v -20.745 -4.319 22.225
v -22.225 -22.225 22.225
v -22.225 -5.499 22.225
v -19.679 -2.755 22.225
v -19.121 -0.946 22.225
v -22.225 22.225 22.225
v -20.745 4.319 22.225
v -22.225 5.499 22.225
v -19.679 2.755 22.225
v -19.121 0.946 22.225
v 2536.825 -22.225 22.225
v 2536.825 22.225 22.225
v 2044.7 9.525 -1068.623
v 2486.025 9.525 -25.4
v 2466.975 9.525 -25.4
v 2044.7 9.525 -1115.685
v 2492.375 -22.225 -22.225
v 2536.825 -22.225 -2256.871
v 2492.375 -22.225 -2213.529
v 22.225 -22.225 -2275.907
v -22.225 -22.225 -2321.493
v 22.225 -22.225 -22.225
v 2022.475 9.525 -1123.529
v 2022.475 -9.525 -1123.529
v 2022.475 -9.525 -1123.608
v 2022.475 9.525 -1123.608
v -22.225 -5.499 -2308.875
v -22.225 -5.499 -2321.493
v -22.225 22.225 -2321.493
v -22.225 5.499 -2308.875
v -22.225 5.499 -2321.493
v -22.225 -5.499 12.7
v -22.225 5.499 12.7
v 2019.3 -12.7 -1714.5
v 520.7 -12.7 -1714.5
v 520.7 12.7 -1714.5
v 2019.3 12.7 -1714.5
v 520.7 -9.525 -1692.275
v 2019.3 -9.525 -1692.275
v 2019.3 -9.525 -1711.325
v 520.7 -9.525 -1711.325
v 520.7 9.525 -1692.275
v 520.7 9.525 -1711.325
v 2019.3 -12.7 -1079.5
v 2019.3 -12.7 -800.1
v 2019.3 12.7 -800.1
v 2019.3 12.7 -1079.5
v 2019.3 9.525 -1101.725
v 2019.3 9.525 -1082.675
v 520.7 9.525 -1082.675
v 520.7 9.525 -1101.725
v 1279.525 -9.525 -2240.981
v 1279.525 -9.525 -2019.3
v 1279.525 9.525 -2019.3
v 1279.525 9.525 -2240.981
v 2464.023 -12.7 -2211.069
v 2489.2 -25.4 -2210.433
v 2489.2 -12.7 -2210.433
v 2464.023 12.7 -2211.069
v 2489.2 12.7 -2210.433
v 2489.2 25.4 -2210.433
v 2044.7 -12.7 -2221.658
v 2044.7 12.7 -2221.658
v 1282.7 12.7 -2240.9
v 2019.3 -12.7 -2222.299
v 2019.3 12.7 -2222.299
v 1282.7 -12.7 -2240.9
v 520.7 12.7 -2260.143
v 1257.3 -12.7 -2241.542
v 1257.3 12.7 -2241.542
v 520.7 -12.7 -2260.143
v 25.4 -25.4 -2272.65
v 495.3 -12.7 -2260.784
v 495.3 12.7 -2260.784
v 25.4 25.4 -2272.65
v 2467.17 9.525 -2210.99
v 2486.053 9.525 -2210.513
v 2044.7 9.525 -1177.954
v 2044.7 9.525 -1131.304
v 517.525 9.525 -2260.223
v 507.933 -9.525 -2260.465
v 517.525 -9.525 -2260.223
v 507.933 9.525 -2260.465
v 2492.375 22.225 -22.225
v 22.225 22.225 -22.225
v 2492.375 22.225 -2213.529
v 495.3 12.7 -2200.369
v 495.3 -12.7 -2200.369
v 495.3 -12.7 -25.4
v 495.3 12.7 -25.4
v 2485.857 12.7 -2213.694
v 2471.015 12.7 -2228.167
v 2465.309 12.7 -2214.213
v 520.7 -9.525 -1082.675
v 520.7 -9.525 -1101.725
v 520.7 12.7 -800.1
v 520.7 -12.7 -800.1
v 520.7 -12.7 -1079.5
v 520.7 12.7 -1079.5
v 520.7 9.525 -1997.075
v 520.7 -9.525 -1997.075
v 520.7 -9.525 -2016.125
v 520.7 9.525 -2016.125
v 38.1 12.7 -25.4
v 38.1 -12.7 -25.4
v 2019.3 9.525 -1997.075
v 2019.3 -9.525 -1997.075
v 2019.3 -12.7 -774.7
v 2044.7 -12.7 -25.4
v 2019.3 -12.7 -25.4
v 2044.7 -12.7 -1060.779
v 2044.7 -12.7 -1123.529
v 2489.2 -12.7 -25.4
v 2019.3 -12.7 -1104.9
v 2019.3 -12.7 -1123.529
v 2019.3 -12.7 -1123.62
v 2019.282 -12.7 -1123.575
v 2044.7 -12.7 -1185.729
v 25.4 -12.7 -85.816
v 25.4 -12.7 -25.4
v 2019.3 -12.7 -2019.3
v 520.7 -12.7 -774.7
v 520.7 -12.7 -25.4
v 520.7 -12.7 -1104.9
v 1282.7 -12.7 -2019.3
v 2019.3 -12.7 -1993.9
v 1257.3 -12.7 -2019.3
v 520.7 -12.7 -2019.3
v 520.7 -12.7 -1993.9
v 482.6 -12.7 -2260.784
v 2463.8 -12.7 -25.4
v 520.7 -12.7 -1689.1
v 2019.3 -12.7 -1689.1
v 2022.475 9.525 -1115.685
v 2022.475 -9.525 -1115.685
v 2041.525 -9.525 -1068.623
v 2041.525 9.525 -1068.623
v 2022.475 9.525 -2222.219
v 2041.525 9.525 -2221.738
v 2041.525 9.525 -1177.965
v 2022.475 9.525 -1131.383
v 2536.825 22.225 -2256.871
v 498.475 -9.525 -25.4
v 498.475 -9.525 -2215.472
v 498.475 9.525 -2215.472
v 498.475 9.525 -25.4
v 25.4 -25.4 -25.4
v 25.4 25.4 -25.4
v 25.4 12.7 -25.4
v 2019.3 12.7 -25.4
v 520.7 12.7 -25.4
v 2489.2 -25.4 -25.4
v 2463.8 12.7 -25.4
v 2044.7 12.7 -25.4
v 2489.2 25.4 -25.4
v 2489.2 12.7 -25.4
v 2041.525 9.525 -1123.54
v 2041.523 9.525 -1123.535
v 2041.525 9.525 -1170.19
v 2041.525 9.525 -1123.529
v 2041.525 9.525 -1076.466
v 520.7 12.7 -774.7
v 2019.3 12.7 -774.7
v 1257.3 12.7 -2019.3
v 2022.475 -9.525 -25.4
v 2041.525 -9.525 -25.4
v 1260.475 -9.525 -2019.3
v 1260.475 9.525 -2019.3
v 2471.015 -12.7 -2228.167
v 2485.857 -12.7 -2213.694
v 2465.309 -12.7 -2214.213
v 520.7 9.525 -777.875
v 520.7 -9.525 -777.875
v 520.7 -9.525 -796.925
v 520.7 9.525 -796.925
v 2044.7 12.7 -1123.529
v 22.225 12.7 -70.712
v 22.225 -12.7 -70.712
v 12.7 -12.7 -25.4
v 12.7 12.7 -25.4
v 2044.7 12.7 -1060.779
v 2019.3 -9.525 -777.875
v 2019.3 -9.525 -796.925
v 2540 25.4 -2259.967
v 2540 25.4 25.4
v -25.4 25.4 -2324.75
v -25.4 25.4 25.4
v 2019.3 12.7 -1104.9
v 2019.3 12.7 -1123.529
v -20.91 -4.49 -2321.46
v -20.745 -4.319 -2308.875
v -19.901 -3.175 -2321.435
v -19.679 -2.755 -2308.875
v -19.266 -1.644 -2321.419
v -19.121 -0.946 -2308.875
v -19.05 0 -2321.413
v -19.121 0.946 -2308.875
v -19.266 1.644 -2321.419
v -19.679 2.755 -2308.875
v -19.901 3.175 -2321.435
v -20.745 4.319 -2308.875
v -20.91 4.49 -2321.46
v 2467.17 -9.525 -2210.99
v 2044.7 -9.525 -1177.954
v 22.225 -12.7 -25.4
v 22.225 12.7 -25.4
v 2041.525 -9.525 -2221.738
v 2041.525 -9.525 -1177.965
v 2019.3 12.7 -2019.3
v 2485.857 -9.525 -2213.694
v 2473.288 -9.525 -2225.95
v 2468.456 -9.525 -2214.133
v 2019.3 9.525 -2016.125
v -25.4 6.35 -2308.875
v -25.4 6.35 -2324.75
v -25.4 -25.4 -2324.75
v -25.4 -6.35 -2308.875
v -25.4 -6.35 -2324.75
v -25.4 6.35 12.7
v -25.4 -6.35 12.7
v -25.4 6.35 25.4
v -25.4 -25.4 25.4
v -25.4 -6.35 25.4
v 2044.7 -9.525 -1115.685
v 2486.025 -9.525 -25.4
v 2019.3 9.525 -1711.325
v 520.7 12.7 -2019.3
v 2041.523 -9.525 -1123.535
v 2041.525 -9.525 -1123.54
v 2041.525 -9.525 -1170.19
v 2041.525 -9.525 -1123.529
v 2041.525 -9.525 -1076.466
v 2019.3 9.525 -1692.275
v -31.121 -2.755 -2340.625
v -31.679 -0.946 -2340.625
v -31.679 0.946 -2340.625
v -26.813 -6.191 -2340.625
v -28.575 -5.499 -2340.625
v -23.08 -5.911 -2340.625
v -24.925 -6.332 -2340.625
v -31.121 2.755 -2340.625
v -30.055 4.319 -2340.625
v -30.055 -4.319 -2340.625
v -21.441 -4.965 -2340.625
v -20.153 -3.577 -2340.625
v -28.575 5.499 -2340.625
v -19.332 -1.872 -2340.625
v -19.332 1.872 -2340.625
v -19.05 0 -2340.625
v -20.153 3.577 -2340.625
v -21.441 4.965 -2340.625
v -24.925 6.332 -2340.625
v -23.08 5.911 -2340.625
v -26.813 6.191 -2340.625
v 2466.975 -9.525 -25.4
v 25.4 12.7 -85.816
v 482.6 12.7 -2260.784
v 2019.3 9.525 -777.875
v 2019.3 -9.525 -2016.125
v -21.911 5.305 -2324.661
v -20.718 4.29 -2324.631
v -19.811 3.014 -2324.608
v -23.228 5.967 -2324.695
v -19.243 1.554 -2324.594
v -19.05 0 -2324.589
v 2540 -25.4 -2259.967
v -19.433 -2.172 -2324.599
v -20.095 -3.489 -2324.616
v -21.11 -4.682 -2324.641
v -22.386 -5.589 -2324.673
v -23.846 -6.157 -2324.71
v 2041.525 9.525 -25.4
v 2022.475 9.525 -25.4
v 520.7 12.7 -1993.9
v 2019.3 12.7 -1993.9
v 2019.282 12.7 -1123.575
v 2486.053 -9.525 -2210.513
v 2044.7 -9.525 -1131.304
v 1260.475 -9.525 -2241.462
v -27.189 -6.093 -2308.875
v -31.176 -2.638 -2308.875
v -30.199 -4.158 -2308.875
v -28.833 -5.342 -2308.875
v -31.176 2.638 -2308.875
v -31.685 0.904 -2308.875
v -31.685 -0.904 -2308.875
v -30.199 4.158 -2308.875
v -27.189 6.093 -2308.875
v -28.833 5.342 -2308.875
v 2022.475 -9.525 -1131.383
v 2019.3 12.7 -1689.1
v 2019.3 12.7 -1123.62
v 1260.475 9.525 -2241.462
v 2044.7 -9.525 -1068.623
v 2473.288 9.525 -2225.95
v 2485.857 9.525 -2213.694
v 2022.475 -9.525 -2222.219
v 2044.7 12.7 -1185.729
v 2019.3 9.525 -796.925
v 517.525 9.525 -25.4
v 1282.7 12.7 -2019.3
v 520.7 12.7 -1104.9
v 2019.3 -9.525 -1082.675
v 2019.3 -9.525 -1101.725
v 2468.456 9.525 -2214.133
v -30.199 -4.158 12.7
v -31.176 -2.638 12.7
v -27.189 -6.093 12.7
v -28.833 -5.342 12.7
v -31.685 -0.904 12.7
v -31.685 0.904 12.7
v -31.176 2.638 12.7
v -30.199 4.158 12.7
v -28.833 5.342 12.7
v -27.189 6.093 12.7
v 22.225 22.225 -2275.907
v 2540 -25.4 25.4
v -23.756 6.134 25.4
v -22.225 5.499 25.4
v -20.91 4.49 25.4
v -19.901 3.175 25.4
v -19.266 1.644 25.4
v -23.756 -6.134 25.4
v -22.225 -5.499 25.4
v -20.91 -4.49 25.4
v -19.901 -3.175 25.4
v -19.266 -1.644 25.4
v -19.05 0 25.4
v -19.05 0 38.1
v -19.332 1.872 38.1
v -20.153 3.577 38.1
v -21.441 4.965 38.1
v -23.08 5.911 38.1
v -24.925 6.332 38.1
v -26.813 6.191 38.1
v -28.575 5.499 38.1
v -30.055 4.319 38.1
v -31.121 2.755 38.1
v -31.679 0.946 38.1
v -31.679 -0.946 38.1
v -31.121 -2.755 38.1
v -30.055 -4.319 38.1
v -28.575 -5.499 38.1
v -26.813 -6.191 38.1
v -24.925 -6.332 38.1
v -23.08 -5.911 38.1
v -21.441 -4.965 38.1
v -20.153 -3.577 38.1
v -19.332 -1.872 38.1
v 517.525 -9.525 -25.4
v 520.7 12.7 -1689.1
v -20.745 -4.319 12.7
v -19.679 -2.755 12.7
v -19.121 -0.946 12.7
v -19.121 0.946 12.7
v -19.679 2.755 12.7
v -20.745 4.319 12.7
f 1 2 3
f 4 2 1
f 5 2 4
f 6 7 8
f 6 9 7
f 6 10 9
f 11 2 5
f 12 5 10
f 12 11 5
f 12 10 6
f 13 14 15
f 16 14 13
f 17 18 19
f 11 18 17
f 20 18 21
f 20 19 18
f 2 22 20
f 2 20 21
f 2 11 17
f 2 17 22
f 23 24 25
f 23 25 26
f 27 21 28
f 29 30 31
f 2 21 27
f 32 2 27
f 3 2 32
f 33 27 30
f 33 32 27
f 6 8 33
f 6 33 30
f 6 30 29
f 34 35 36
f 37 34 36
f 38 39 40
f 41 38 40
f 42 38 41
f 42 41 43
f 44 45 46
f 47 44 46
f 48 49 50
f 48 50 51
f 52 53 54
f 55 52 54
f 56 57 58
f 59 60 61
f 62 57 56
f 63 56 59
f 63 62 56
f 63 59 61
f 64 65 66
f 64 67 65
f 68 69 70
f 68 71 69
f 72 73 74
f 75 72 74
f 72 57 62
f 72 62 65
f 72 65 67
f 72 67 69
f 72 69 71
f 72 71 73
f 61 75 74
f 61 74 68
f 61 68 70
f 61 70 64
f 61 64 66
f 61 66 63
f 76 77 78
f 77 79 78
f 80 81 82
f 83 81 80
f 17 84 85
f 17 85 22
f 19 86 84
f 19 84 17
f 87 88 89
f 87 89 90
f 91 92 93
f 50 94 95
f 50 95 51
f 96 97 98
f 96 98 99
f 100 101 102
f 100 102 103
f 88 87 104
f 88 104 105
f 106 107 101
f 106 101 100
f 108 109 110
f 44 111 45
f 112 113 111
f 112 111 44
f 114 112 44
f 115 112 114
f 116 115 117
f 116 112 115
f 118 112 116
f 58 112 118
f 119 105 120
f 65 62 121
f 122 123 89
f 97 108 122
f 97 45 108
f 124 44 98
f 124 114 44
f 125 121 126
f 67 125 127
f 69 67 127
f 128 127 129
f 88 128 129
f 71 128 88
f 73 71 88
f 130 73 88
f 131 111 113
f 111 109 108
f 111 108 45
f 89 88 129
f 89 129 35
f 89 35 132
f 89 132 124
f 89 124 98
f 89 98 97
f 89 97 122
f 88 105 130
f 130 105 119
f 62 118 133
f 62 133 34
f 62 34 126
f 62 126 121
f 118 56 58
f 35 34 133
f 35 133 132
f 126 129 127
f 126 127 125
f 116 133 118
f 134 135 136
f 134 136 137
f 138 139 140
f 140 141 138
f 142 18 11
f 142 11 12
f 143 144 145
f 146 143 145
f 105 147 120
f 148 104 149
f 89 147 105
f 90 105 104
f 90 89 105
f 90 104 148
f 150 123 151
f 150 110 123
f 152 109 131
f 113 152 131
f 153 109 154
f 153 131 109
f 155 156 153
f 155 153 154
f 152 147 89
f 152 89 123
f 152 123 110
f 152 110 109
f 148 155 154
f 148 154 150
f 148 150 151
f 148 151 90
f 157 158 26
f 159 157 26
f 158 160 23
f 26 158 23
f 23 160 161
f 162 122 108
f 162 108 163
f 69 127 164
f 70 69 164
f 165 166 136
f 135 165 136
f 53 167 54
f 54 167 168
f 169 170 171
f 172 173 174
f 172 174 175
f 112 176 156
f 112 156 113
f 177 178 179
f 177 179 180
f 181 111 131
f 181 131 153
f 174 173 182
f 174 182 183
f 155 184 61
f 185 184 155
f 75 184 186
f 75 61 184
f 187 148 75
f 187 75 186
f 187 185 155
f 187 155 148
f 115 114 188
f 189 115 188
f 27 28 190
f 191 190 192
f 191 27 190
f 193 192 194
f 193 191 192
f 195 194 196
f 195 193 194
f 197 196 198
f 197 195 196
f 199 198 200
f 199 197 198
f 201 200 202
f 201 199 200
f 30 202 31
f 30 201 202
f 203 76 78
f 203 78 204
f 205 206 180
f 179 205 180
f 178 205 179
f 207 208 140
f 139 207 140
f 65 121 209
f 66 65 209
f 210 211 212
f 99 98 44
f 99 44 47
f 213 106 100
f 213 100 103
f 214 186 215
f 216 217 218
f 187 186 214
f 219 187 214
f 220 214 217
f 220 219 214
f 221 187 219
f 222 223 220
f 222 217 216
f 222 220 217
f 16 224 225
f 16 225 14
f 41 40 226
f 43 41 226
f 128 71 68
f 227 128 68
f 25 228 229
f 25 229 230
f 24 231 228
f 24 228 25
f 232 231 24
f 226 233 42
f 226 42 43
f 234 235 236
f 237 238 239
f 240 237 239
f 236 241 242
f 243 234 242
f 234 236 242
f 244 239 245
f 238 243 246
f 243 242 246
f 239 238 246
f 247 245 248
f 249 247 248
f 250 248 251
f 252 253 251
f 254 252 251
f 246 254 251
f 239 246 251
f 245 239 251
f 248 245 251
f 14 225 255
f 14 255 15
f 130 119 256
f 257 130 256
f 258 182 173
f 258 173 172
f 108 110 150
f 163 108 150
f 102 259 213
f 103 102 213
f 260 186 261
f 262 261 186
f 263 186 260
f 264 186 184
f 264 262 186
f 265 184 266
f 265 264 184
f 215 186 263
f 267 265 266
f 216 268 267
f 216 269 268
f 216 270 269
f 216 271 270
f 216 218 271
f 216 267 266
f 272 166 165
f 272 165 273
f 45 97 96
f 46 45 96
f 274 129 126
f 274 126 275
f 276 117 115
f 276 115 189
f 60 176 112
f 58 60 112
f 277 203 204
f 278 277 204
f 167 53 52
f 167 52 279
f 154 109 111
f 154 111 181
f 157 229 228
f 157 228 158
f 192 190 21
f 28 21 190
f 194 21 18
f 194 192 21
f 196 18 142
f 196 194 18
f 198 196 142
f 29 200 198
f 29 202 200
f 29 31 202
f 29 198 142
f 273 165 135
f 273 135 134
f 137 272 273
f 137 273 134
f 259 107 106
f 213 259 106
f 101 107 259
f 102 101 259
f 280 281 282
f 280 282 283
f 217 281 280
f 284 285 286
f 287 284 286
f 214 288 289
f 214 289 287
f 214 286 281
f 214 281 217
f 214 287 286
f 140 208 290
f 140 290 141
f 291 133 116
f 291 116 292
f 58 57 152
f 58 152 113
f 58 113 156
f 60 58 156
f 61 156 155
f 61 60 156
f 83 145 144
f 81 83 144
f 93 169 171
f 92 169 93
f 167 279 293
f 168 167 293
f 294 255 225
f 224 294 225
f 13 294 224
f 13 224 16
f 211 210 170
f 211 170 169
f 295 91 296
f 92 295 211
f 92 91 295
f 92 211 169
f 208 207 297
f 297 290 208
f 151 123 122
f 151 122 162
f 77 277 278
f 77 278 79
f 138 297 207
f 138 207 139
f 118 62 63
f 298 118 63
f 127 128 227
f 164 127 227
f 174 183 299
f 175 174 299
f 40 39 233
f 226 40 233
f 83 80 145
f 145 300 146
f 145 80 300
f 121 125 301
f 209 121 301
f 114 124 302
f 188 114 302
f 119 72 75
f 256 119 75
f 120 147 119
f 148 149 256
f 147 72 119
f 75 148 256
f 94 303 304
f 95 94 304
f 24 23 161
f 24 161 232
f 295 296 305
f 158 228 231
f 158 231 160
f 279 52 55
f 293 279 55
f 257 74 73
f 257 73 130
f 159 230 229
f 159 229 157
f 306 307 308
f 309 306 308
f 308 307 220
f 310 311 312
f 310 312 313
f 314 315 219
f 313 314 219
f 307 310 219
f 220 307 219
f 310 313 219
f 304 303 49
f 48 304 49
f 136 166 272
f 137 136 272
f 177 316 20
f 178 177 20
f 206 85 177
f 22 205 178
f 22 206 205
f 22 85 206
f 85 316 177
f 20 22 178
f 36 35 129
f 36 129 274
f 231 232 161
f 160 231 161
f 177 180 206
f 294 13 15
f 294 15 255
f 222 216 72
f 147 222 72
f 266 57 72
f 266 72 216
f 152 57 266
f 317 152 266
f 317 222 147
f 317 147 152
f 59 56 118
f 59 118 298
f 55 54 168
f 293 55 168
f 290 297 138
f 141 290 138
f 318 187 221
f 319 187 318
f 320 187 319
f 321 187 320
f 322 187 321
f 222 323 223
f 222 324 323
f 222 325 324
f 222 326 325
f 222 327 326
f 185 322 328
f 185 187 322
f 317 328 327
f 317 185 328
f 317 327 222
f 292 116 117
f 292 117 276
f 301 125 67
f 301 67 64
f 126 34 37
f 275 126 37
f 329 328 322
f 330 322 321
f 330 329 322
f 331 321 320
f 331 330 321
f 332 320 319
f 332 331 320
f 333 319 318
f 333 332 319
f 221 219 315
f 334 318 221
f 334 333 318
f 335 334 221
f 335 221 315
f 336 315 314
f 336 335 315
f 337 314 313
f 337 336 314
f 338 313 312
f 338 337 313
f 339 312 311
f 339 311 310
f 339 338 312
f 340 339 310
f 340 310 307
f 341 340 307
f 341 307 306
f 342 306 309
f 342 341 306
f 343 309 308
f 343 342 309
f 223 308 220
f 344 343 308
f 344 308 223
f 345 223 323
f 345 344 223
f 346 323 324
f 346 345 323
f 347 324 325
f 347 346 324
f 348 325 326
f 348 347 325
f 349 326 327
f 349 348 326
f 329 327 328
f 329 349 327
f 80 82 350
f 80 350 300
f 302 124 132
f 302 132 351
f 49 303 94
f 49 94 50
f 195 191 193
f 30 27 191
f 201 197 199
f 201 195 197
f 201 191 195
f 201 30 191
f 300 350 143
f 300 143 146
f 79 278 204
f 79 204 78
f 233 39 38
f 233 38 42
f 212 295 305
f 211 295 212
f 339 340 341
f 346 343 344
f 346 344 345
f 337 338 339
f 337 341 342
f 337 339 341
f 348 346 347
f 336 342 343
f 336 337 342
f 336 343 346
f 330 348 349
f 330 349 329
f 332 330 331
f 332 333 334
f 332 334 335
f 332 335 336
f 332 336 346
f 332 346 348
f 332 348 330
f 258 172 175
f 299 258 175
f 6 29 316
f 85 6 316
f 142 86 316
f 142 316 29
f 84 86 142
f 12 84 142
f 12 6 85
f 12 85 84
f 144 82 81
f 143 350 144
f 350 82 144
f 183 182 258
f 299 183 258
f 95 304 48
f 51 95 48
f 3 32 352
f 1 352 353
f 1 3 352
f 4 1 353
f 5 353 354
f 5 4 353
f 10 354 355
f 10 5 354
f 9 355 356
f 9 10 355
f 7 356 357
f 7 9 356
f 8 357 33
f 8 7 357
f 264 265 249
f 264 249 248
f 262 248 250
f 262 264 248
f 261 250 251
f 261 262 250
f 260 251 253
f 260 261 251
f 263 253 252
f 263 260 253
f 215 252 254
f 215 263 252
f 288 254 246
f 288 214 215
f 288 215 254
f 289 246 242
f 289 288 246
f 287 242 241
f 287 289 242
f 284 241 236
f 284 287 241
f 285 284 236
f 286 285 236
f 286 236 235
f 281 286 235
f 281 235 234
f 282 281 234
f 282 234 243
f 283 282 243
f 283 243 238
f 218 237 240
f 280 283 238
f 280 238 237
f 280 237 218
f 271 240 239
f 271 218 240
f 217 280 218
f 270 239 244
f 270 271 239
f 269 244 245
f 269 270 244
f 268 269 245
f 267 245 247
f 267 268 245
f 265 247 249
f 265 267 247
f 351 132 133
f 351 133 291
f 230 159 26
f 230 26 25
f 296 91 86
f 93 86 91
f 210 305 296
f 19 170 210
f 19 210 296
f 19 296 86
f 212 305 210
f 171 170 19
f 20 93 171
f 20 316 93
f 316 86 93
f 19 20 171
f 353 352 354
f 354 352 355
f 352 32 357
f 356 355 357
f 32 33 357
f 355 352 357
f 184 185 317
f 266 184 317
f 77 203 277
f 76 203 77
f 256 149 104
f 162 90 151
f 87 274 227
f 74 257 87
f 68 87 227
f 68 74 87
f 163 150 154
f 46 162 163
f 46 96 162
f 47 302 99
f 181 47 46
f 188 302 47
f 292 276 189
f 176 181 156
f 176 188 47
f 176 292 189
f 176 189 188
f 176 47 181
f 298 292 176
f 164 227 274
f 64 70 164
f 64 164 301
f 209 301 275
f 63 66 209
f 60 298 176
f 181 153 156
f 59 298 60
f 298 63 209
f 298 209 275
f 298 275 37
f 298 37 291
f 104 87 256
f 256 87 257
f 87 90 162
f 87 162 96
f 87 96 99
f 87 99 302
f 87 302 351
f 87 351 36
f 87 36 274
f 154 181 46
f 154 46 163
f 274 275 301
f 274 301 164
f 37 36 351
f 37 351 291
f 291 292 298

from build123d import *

# Parameters (mm, degrees)
SKETCH2_W           = 50.8
SKETCH2_H           = 50.8
SKETCH2_W_2         = 44.45
SKETCH2_H_2         = 44.45
BOSS_EXTRUDE2_REACH = 2301.35
SKETCH4_W           = 25.4
SKETCH4_H           = 25.4
SKETCH4_W_2         = 19.05
SKETCH4_H_2         = 19.05
SKETCH5_W           = 25.4
SKETCH5_H           = 25.4
SKETCH5_W_2         = 19.05
SKETCH5_H_2         = 19.05
BOSS_EXTRUDE3_DEPTH = 1498.6
SKETCH6_W           = 25.4
SKETCH6_H           = 25.4
BOSS_EXTRUDE4_REACH = 307.45
SKETCH8_W           = 25.4
SKETCH8_H           = 25.4
SKETCH8_W_2         = 19.05
SKETCH8_H_2         = 19.05
SKETCH9_W           = 25.4
SKETCH9_H           = 25.4
SKETCH9_W_2         = 19.05
SKETCH9_H_2         = 19.05
SKETCH11_R          = 6.35
BOSS_EXTRUDE5_DEPTH = 12.7
SKETCH13_R          = 6.35
BOSS_EXTRUDE6_DEPTH = 15.875


with BuildPart() as part:
    # Sweep1: sweep along a path in Sketch1
    with BuildLine(Plane(origin=(0, 0, 0), x_dir=(1, 0, 0), z_dir=(0, 1, 0))) as sweep1_path:
        Line((0, 2298.7), (0, 0))
        Line((0, 0), (2514.6, 0))
        Line((2514.6, 0), (2514.6, 2235.2))
        Line((2514.6, 2235.2), (0, 2298.7))
    # Sketch2 → Sweep1 (sweep)
    with BuildSketch(Plane.XY.offset(-1016)):
        Rectangle(SKETCH2_W, SKETCH2_H)
        Rectangle(SKETCH2_W_2, SKETCH2_H_2, mode=Mode.SUBTRACT)
    sweep(path=sweep1_path.line, transition=Transition.RIGHT)

    # Boss-Extrude2: up to this face of the body (flat: up to its plane)
    boss_extrude2_end = Plane(part.part.faces().sort_by_distance((1257.3, 0, -2241.541902627))[0])
    # Sketch4 → Boss-Extrude2 (add, up to the picked face)
    with BuildSketch(Plane(origin=(0, 0, -25.4), x_dir=(-1, 0, 0), z_dir=(0, 0, -1)), mode=Mode.PRIVATE) as boss_extrude2_sk1:
        with Locations((-2032, 0)):
            Rectangle(SKETCH4_W, SKETCH4_H)
        with Locations((-2032, 0)):
            Rectangle(SKETCH4_W_2, SKETCH4_H_2, mode=Mode.SUBTRACT)
    boss_extrude2_tool1 = split(extrude(boss_extrude2_sk1.sketch, amount=BOSS_EXTRUDE2_REACH, mode=Mode.PRIVATE), bisect_by=boss_extrude2_end, keep=Keep.BOTH, mode=Mode.PRIVATE)
    add(boss_extrude2_tool1.solids().sort_by_distance((2032, -12.34079, -25.4))[0])
    # Sketch4 → Boss-Extrude2 (add, up to the picked face)
    with BuildSketch(Plane(origin=(0, 0, -25.4), x_dir=(-1, 0, 0), z_dir=(0, 0, -1)), mode=Mode.PRIVATE) as boss_extrude2_sk2:
        with Locations((-508, 0)):
            Rectangle(SKETCH4_W, SKETCH4_H)
        with Locations((-508, 0)):
            Rectangle(SKETCH4_W_2, SKETCH4_H_2, mode=Mode.SUBTRACT)
    boss_extrude2_tool2 = split(extrude(boss_extrude2_sk2.sketch, amount=BOSS_EXTRUDE2_REACH, mode=Mode.PRIVATE), bisect_by=boss_extrude2_end, keep=Keep.BOTH, mode=Mode.PRIVATE)
    add(boss_extrude2_tool2.solids().sort_by_distance((495.65921, 0, -25.4))[0])

    # Sketch5 → Boss-Extrude3 (add)
    with BuildSketch(Plane(origin=(520.7, 0, 0), x_dir=(0, 0, -1), z_dir=(1, 0, 0))):
        with Locations((787.4, 0)):
            Rectangle(SKETCH5_W, SKETCH5_H)
        with Locations((787.4, 0)):
            Rectangle(SKETCH5_W_2, SKETCH5_H_2, mode=Mode.SUBTRACT)
        with Locations((1092.2, 0)):
            Rectangle(SKETCH5_W, SKETCH5_H)
        with Locations((1092.2, 0)):
            Rectangle(SKETCH5_W_2, SKETCH5_H_2, mode=Mode.SUBTRACT)
        with Locations((1701.8, 0)):
            Rectangle(SKETCH5_W, SKETCH5_H)
        with Locations((1701.8, 0)):
            Rectangle(SKETCH5_W_2, SKETCH5_H_2, mode=Mode.SUBTRACT)
        with Locations((2006.6, 0)):
            Rectangle(SKETCH5_W, SKETCH5_H)
        with Locations((2006.6, 0)):
            Rectangle(SKETCH5_W_2, SKETCH5_H_2, mode=Mode.SUBTRACT)
    extrude(amount=BOSS_EXTRUDE3_DEPTH)

    # Sweep2: sweep along a path in Sketch7
    with BuildLine(Plane(origin=(0, 25.4, 0), x_dir=(1, 0, 0), z_dir=(0, 1, 0))) as sweep2_path:
        Line((25.4, 25.4), (495.3, 2260.78432687))
    # Sketch6 → Sweep2 (sweep)
    with BuildSketch(Plane(origin=(0, 0, -25.4), x_dir=(-1, 0, 0), z_dir=(0, 0, -1))):
        with Locations((-25.4, 0)):
            Rectangle(SKETCH6_W, SKETCH6_H)
    sweep(path=sweep2_path.line)

    # Boss-Extrude4: up to this face of the body (flat: up to its plane)
    boss_extrude4_end = Plane(part.part.faces().sort_by_distance((1257.167708333, 0, -2241.545243326))[0])
    # Sketch8 → Boss-Extrude4 (add, up to the picked face)
    with BuildSketch(Plane(origin=(0, 0, -2019.3), x_dir=(-1, 0, 0), z_dir=(0, 0, -1)), mode=Mode.PRIVATE) as boss_extrude4_sk1:
        with Locations((-1270, 0)):
            Rectangle(SKETCH8_W, SKETCH8_H)
        with Locations((-1270, 0)):
            Rectangle(SKETCH8_W_2, SKETCH8_H_2, mode=Mode.SUBTRACT)
    boss_extrude4_tool1 = split(extrude(boss_extrude4_sk1.sketch, amount=BOSS_EXTRUDE4_REACH, mode=Mode.PRIVATE), bisect_by=boss_extrude4_end, keep=Keep.BOTH, mode=Mode.PRIVATE)
    add(boss_extrude4_tool1.solids().sort_by_distance((1270, -12.34079, -2019.3))[0])

    # Sweep4: sweep along a path in Sketch10
    with BuildLine(Plane(origin=(0, 25.4, 0), x_dir=(1, 0, 0), z_dir=(0, 1, 0))) as sweep4_path:
        Line((2489.2, 25.4), (2044.7, 1123.529032122))
        Line((2044.7, 1123.529032122), (2489.2, 2210.433316769))
    # Sketch9 → Sweep4 (sweep)
    with BuildSketch(Plane(origin=(0, 0, -25.4), x_dir=(-1, 0, 0), z_dir=(0, 0, -1))):
        with Locations((-2476.5, 0)):
            Rectangle(SKETCH9_W, SKETCH9_H)
        with Locations((-2476.5, 0)):
            Rectangle(SKETCH9_W_2, SKETCH9_H_2, mode=Mode.SUBTRACT)
    sweep(path=sweep4_path.line, transition=Transition.RIGHT)

    # Sketch11 → Boss-Extrude5 (add, symmetric)
    with BuildSketch(Plane.XY.offset(25.4)):
        with Locations((-25.4, 0)):
            Circle(SKETCH11_R)
    extrude(amount=BOSS_EXTRUDE5_DEPTH, both=True)

    # Sketch13 → Boss-Extrude6 (add, symmetric)
    with BuildSketch(Plane.XY.offset(-2324.749511514)):
        with Locations((-25.4, 0)):
            Circle(SKETCH13_R)
    extrude(amount=BOSS_EXTRUDE6_DEPTH, both=True)


solid = part.part
